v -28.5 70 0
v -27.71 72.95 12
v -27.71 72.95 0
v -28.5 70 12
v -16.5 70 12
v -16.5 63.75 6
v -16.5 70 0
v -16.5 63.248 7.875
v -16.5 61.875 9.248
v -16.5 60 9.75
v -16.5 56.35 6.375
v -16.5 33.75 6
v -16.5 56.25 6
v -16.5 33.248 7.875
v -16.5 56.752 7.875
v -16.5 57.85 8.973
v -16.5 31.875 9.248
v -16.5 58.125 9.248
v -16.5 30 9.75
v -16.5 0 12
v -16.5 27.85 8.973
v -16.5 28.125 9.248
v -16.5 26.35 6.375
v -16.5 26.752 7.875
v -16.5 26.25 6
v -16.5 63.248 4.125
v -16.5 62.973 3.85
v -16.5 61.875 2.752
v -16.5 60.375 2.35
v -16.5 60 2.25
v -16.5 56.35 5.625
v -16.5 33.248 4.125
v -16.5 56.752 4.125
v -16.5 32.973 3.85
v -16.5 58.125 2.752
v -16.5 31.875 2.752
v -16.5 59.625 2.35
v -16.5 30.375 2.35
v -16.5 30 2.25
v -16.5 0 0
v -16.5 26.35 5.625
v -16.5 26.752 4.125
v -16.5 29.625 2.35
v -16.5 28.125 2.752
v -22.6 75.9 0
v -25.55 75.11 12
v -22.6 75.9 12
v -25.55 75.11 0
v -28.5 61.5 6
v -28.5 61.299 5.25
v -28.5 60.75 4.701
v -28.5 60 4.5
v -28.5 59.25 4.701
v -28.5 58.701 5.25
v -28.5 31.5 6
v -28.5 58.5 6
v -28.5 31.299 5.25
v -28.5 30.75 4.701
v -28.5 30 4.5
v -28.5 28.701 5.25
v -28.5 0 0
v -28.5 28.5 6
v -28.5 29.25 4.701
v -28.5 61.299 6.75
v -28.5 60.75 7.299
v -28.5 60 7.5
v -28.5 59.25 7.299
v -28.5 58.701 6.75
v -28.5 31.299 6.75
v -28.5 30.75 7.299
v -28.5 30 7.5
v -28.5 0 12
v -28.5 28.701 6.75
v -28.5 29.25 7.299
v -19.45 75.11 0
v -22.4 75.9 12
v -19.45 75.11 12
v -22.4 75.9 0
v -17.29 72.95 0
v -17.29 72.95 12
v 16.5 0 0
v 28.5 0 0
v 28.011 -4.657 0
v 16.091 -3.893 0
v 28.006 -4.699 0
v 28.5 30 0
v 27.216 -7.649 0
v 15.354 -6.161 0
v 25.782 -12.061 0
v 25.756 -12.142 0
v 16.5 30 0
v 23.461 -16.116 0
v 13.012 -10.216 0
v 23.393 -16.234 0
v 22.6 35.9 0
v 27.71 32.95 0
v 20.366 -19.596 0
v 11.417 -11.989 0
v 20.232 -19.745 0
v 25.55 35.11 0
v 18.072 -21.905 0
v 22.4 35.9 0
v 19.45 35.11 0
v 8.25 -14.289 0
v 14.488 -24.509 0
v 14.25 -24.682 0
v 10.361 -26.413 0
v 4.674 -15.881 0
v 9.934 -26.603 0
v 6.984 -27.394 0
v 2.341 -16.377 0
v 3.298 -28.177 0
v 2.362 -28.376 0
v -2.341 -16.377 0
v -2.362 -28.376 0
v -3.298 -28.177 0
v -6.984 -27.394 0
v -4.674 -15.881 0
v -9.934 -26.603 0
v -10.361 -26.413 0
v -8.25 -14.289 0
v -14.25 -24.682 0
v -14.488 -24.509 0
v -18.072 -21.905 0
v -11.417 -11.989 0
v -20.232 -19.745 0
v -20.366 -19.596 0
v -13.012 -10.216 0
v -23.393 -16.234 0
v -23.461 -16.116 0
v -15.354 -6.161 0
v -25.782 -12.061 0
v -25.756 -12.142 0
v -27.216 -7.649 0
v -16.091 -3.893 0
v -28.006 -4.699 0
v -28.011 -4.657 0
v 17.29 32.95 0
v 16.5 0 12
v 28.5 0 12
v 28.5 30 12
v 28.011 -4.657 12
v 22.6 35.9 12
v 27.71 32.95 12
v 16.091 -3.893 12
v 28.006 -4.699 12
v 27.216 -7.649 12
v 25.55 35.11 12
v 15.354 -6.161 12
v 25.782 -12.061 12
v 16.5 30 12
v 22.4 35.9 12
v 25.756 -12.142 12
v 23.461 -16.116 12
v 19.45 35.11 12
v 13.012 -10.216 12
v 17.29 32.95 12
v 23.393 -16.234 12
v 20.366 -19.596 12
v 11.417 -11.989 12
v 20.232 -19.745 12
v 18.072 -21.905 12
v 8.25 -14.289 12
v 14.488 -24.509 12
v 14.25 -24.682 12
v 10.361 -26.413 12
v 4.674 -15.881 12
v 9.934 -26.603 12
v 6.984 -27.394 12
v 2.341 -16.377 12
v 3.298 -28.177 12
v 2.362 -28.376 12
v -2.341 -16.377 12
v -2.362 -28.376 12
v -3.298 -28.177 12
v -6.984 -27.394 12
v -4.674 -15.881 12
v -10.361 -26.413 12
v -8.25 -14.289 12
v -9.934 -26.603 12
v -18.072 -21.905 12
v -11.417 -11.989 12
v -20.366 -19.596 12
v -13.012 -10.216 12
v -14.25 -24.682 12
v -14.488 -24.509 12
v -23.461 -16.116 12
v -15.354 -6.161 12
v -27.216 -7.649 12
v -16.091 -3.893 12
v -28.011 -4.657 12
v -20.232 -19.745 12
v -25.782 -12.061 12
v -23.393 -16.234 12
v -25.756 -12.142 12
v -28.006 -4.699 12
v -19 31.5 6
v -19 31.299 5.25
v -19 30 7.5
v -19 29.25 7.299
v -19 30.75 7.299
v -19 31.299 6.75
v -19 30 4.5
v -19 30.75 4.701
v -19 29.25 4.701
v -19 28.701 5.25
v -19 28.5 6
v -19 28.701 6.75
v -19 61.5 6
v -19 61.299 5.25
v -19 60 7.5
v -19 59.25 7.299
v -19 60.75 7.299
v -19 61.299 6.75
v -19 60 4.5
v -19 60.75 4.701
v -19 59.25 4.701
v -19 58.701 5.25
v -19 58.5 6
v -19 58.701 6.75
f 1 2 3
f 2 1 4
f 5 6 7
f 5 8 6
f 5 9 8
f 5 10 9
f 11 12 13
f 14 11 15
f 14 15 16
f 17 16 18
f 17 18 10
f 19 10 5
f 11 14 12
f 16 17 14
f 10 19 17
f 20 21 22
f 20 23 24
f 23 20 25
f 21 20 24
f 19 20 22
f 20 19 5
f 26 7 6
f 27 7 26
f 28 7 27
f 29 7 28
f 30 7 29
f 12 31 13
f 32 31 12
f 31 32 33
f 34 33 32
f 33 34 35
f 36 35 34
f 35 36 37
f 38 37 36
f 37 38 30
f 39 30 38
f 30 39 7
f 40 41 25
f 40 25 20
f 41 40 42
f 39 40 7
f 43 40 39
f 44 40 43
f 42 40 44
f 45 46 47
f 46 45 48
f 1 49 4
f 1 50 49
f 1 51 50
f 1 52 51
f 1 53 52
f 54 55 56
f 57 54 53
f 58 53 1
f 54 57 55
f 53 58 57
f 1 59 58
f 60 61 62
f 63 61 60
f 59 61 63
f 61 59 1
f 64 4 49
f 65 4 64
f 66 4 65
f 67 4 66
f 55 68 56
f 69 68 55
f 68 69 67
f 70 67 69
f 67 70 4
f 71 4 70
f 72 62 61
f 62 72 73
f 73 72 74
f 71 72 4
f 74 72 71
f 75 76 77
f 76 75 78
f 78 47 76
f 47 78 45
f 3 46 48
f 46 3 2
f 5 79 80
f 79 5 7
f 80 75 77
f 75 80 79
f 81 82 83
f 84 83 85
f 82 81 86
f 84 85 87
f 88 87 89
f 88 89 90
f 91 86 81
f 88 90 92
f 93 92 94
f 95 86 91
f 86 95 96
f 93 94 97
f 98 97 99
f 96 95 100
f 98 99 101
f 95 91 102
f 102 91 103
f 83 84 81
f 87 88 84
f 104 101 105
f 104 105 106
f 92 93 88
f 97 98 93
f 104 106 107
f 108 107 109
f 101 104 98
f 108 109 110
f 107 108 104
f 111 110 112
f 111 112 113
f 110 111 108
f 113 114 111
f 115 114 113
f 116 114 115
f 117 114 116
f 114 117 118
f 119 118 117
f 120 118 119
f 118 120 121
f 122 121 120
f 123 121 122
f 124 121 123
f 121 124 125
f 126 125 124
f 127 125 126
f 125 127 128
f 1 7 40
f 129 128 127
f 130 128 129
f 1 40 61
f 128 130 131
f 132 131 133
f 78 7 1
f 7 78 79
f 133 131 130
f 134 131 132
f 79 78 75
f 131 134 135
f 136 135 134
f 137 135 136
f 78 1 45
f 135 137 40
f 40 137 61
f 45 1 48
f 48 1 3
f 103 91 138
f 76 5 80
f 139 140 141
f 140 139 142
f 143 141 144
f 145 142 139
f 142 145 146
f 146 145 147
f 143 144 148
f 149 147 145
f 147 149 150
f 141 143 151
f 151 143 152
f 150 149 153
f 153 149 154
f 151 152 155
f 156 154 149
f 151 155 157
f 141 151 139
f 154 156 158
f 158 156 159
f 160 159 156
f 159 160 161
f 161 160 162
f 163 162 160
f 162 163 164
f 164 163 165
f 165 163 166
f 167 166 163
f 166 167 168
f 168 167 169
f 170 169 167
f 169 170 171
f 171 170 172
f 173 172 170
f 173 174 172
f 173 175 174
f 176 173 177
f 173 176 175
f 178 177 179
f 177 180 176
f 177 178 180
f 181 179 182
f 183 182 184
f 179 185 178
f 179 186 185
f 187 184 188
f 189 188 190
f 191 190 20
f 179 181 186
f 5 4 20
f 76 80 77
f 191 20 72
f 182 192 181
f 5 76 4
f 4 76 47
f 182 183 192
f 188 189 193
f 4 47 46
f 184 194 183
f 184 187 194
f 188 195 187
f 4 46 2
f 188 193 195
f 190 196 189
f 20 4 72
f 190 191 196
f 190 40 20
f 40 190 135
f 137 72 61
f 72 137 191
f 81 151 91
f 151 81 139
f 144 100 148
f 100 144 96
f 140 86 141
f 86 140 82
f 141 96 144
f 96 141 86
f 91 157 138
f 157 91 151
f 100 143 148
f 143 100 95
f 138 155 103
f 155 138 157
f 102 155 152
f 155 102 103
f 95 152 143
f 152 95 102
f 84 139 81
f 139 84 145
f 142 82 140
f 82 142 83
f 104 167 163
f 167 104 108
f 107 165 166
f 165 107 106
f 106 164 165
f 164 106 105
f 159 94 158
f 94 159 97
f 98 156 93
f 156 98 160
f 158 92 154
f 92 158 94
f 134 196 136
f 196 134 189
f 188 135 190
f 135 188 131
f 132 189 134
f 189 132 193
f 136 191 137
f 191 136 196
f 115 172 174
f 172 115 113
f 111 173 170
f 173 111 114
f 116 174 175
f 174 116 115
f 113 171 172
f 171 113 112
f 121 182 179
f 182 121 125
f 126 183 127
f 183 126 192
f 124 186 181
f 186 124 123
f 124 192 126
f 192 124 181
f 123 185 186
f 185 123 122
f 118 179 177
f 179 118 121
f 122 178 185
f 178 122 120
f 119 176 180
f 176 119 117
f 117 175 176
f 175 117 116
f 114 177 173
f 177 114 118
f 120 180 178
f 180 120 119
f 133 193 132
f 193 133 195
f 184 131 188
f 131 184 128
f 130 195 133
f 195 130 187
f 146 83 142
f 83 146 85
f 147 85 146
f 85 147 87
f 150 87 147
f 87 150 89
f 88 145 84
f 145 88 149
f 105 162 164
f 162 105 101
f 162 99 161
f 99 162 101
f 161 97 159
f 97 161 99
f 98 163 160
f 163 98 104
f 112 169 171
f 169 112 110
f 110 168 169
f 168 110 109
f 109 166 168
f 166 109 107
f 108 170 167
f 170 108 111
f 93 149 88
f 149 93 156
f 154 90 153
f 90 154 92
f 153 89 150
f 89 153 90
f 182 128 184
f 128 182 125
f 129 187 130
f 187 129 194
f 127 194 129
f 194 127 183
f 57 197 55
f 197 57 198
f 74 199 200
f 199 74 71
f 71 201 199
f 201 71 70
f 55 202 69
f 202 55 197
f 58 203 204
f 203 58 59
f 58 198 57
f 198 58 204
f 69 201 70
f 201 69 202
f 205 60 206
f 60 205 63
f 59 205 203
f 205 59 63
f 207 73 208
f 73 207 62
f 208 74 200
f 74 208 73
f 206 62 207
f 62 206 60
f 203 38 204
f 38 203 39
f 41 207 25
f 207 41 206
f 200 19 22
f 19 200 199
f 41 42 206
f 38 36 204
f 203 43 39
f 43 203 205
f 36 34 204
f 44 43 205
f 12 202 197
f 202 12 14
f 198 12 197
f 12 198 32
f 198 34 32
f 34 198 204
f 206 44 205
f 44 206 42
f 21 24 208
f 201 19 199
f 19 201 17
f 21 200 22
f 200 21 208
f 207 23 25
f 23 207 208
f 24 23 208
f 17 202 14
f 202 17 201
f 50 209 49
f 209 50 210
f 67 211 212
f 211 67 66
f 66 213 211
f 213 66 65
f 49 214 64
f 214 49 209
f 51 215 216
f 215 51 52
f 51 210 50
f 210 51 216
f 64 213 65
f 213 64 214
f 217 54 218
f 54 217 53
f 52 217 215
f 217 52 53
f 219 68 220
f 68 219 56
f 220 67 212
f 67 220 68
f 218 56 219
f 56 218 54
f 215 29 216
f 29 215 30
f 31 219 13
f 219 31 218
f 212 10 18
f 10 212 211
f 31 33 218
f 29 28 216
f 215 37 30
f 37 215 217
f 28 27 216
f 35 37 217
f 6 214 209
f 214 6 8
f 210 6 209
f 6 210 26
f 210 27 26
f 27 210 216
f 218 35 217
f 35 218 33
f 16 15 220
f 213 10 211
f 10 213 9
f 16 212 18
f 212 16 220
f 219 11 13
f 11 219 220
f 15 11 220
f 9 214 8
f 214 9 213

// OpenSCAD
width=12;
thick=width;
d=33+width;
rad=d/2;
roundrad=thick/2-0.1; //less than thick/2
height=70;
theight=30;
roundsegs=12;

sthick=thick-roundrad*2;

wall_hook();


module wall_hook()
{
	difference(){
    	translate([0,0,0.5])

	minkowski(){
	union() {
		// hook
		difference() {
			cylinder(h=width-1, r=rad+sthick/2);
			translate(v=[0,0,-1]) cylinder(h=width+1, r=rad-sthick/2);
			translate(v=[-rad-sthick,0,-1]) cube(size=[2*rad+2*sthick,rad+sthick,width+4]);
		}
// wall 
		translate(v=[-rad-sthick/2,0,0]) cube(size=[sthick,height,width-1]);
// end-tip
		translate(v=[rad-sthick/2,0,0]) cube(size=[sthick,theight,width-1]);
	}
	cylinder(h=1,r=roundrad,$fn=roundsegs,center=true);
}


			// screw hole
	translate(v=[-rad,height-10,width/2]) rotate(a=[0,90,0]) cylinder(h=15, r=1.5, $fn=12,center=true);
	translate(v=[-rad+thick/2,height-10,width/2]) rotate(a=[0,90,0]) cylinder(h=5, r1=1.5, r2=6,$fn=12,center=true);
if (height>30) {
	translate(v=[-rad,theight,width/2]) rotate(a=[0,90,0]) cylinder(h=15, r=1.5, $fn=12,center=true);
	translate(v=[-rad+thick/2,theight,width/2]) rotate(a=[0,90,0]) cylinder(h=5, r1=1.5, r2=6,$fn=12,center=true);

}
}
}
